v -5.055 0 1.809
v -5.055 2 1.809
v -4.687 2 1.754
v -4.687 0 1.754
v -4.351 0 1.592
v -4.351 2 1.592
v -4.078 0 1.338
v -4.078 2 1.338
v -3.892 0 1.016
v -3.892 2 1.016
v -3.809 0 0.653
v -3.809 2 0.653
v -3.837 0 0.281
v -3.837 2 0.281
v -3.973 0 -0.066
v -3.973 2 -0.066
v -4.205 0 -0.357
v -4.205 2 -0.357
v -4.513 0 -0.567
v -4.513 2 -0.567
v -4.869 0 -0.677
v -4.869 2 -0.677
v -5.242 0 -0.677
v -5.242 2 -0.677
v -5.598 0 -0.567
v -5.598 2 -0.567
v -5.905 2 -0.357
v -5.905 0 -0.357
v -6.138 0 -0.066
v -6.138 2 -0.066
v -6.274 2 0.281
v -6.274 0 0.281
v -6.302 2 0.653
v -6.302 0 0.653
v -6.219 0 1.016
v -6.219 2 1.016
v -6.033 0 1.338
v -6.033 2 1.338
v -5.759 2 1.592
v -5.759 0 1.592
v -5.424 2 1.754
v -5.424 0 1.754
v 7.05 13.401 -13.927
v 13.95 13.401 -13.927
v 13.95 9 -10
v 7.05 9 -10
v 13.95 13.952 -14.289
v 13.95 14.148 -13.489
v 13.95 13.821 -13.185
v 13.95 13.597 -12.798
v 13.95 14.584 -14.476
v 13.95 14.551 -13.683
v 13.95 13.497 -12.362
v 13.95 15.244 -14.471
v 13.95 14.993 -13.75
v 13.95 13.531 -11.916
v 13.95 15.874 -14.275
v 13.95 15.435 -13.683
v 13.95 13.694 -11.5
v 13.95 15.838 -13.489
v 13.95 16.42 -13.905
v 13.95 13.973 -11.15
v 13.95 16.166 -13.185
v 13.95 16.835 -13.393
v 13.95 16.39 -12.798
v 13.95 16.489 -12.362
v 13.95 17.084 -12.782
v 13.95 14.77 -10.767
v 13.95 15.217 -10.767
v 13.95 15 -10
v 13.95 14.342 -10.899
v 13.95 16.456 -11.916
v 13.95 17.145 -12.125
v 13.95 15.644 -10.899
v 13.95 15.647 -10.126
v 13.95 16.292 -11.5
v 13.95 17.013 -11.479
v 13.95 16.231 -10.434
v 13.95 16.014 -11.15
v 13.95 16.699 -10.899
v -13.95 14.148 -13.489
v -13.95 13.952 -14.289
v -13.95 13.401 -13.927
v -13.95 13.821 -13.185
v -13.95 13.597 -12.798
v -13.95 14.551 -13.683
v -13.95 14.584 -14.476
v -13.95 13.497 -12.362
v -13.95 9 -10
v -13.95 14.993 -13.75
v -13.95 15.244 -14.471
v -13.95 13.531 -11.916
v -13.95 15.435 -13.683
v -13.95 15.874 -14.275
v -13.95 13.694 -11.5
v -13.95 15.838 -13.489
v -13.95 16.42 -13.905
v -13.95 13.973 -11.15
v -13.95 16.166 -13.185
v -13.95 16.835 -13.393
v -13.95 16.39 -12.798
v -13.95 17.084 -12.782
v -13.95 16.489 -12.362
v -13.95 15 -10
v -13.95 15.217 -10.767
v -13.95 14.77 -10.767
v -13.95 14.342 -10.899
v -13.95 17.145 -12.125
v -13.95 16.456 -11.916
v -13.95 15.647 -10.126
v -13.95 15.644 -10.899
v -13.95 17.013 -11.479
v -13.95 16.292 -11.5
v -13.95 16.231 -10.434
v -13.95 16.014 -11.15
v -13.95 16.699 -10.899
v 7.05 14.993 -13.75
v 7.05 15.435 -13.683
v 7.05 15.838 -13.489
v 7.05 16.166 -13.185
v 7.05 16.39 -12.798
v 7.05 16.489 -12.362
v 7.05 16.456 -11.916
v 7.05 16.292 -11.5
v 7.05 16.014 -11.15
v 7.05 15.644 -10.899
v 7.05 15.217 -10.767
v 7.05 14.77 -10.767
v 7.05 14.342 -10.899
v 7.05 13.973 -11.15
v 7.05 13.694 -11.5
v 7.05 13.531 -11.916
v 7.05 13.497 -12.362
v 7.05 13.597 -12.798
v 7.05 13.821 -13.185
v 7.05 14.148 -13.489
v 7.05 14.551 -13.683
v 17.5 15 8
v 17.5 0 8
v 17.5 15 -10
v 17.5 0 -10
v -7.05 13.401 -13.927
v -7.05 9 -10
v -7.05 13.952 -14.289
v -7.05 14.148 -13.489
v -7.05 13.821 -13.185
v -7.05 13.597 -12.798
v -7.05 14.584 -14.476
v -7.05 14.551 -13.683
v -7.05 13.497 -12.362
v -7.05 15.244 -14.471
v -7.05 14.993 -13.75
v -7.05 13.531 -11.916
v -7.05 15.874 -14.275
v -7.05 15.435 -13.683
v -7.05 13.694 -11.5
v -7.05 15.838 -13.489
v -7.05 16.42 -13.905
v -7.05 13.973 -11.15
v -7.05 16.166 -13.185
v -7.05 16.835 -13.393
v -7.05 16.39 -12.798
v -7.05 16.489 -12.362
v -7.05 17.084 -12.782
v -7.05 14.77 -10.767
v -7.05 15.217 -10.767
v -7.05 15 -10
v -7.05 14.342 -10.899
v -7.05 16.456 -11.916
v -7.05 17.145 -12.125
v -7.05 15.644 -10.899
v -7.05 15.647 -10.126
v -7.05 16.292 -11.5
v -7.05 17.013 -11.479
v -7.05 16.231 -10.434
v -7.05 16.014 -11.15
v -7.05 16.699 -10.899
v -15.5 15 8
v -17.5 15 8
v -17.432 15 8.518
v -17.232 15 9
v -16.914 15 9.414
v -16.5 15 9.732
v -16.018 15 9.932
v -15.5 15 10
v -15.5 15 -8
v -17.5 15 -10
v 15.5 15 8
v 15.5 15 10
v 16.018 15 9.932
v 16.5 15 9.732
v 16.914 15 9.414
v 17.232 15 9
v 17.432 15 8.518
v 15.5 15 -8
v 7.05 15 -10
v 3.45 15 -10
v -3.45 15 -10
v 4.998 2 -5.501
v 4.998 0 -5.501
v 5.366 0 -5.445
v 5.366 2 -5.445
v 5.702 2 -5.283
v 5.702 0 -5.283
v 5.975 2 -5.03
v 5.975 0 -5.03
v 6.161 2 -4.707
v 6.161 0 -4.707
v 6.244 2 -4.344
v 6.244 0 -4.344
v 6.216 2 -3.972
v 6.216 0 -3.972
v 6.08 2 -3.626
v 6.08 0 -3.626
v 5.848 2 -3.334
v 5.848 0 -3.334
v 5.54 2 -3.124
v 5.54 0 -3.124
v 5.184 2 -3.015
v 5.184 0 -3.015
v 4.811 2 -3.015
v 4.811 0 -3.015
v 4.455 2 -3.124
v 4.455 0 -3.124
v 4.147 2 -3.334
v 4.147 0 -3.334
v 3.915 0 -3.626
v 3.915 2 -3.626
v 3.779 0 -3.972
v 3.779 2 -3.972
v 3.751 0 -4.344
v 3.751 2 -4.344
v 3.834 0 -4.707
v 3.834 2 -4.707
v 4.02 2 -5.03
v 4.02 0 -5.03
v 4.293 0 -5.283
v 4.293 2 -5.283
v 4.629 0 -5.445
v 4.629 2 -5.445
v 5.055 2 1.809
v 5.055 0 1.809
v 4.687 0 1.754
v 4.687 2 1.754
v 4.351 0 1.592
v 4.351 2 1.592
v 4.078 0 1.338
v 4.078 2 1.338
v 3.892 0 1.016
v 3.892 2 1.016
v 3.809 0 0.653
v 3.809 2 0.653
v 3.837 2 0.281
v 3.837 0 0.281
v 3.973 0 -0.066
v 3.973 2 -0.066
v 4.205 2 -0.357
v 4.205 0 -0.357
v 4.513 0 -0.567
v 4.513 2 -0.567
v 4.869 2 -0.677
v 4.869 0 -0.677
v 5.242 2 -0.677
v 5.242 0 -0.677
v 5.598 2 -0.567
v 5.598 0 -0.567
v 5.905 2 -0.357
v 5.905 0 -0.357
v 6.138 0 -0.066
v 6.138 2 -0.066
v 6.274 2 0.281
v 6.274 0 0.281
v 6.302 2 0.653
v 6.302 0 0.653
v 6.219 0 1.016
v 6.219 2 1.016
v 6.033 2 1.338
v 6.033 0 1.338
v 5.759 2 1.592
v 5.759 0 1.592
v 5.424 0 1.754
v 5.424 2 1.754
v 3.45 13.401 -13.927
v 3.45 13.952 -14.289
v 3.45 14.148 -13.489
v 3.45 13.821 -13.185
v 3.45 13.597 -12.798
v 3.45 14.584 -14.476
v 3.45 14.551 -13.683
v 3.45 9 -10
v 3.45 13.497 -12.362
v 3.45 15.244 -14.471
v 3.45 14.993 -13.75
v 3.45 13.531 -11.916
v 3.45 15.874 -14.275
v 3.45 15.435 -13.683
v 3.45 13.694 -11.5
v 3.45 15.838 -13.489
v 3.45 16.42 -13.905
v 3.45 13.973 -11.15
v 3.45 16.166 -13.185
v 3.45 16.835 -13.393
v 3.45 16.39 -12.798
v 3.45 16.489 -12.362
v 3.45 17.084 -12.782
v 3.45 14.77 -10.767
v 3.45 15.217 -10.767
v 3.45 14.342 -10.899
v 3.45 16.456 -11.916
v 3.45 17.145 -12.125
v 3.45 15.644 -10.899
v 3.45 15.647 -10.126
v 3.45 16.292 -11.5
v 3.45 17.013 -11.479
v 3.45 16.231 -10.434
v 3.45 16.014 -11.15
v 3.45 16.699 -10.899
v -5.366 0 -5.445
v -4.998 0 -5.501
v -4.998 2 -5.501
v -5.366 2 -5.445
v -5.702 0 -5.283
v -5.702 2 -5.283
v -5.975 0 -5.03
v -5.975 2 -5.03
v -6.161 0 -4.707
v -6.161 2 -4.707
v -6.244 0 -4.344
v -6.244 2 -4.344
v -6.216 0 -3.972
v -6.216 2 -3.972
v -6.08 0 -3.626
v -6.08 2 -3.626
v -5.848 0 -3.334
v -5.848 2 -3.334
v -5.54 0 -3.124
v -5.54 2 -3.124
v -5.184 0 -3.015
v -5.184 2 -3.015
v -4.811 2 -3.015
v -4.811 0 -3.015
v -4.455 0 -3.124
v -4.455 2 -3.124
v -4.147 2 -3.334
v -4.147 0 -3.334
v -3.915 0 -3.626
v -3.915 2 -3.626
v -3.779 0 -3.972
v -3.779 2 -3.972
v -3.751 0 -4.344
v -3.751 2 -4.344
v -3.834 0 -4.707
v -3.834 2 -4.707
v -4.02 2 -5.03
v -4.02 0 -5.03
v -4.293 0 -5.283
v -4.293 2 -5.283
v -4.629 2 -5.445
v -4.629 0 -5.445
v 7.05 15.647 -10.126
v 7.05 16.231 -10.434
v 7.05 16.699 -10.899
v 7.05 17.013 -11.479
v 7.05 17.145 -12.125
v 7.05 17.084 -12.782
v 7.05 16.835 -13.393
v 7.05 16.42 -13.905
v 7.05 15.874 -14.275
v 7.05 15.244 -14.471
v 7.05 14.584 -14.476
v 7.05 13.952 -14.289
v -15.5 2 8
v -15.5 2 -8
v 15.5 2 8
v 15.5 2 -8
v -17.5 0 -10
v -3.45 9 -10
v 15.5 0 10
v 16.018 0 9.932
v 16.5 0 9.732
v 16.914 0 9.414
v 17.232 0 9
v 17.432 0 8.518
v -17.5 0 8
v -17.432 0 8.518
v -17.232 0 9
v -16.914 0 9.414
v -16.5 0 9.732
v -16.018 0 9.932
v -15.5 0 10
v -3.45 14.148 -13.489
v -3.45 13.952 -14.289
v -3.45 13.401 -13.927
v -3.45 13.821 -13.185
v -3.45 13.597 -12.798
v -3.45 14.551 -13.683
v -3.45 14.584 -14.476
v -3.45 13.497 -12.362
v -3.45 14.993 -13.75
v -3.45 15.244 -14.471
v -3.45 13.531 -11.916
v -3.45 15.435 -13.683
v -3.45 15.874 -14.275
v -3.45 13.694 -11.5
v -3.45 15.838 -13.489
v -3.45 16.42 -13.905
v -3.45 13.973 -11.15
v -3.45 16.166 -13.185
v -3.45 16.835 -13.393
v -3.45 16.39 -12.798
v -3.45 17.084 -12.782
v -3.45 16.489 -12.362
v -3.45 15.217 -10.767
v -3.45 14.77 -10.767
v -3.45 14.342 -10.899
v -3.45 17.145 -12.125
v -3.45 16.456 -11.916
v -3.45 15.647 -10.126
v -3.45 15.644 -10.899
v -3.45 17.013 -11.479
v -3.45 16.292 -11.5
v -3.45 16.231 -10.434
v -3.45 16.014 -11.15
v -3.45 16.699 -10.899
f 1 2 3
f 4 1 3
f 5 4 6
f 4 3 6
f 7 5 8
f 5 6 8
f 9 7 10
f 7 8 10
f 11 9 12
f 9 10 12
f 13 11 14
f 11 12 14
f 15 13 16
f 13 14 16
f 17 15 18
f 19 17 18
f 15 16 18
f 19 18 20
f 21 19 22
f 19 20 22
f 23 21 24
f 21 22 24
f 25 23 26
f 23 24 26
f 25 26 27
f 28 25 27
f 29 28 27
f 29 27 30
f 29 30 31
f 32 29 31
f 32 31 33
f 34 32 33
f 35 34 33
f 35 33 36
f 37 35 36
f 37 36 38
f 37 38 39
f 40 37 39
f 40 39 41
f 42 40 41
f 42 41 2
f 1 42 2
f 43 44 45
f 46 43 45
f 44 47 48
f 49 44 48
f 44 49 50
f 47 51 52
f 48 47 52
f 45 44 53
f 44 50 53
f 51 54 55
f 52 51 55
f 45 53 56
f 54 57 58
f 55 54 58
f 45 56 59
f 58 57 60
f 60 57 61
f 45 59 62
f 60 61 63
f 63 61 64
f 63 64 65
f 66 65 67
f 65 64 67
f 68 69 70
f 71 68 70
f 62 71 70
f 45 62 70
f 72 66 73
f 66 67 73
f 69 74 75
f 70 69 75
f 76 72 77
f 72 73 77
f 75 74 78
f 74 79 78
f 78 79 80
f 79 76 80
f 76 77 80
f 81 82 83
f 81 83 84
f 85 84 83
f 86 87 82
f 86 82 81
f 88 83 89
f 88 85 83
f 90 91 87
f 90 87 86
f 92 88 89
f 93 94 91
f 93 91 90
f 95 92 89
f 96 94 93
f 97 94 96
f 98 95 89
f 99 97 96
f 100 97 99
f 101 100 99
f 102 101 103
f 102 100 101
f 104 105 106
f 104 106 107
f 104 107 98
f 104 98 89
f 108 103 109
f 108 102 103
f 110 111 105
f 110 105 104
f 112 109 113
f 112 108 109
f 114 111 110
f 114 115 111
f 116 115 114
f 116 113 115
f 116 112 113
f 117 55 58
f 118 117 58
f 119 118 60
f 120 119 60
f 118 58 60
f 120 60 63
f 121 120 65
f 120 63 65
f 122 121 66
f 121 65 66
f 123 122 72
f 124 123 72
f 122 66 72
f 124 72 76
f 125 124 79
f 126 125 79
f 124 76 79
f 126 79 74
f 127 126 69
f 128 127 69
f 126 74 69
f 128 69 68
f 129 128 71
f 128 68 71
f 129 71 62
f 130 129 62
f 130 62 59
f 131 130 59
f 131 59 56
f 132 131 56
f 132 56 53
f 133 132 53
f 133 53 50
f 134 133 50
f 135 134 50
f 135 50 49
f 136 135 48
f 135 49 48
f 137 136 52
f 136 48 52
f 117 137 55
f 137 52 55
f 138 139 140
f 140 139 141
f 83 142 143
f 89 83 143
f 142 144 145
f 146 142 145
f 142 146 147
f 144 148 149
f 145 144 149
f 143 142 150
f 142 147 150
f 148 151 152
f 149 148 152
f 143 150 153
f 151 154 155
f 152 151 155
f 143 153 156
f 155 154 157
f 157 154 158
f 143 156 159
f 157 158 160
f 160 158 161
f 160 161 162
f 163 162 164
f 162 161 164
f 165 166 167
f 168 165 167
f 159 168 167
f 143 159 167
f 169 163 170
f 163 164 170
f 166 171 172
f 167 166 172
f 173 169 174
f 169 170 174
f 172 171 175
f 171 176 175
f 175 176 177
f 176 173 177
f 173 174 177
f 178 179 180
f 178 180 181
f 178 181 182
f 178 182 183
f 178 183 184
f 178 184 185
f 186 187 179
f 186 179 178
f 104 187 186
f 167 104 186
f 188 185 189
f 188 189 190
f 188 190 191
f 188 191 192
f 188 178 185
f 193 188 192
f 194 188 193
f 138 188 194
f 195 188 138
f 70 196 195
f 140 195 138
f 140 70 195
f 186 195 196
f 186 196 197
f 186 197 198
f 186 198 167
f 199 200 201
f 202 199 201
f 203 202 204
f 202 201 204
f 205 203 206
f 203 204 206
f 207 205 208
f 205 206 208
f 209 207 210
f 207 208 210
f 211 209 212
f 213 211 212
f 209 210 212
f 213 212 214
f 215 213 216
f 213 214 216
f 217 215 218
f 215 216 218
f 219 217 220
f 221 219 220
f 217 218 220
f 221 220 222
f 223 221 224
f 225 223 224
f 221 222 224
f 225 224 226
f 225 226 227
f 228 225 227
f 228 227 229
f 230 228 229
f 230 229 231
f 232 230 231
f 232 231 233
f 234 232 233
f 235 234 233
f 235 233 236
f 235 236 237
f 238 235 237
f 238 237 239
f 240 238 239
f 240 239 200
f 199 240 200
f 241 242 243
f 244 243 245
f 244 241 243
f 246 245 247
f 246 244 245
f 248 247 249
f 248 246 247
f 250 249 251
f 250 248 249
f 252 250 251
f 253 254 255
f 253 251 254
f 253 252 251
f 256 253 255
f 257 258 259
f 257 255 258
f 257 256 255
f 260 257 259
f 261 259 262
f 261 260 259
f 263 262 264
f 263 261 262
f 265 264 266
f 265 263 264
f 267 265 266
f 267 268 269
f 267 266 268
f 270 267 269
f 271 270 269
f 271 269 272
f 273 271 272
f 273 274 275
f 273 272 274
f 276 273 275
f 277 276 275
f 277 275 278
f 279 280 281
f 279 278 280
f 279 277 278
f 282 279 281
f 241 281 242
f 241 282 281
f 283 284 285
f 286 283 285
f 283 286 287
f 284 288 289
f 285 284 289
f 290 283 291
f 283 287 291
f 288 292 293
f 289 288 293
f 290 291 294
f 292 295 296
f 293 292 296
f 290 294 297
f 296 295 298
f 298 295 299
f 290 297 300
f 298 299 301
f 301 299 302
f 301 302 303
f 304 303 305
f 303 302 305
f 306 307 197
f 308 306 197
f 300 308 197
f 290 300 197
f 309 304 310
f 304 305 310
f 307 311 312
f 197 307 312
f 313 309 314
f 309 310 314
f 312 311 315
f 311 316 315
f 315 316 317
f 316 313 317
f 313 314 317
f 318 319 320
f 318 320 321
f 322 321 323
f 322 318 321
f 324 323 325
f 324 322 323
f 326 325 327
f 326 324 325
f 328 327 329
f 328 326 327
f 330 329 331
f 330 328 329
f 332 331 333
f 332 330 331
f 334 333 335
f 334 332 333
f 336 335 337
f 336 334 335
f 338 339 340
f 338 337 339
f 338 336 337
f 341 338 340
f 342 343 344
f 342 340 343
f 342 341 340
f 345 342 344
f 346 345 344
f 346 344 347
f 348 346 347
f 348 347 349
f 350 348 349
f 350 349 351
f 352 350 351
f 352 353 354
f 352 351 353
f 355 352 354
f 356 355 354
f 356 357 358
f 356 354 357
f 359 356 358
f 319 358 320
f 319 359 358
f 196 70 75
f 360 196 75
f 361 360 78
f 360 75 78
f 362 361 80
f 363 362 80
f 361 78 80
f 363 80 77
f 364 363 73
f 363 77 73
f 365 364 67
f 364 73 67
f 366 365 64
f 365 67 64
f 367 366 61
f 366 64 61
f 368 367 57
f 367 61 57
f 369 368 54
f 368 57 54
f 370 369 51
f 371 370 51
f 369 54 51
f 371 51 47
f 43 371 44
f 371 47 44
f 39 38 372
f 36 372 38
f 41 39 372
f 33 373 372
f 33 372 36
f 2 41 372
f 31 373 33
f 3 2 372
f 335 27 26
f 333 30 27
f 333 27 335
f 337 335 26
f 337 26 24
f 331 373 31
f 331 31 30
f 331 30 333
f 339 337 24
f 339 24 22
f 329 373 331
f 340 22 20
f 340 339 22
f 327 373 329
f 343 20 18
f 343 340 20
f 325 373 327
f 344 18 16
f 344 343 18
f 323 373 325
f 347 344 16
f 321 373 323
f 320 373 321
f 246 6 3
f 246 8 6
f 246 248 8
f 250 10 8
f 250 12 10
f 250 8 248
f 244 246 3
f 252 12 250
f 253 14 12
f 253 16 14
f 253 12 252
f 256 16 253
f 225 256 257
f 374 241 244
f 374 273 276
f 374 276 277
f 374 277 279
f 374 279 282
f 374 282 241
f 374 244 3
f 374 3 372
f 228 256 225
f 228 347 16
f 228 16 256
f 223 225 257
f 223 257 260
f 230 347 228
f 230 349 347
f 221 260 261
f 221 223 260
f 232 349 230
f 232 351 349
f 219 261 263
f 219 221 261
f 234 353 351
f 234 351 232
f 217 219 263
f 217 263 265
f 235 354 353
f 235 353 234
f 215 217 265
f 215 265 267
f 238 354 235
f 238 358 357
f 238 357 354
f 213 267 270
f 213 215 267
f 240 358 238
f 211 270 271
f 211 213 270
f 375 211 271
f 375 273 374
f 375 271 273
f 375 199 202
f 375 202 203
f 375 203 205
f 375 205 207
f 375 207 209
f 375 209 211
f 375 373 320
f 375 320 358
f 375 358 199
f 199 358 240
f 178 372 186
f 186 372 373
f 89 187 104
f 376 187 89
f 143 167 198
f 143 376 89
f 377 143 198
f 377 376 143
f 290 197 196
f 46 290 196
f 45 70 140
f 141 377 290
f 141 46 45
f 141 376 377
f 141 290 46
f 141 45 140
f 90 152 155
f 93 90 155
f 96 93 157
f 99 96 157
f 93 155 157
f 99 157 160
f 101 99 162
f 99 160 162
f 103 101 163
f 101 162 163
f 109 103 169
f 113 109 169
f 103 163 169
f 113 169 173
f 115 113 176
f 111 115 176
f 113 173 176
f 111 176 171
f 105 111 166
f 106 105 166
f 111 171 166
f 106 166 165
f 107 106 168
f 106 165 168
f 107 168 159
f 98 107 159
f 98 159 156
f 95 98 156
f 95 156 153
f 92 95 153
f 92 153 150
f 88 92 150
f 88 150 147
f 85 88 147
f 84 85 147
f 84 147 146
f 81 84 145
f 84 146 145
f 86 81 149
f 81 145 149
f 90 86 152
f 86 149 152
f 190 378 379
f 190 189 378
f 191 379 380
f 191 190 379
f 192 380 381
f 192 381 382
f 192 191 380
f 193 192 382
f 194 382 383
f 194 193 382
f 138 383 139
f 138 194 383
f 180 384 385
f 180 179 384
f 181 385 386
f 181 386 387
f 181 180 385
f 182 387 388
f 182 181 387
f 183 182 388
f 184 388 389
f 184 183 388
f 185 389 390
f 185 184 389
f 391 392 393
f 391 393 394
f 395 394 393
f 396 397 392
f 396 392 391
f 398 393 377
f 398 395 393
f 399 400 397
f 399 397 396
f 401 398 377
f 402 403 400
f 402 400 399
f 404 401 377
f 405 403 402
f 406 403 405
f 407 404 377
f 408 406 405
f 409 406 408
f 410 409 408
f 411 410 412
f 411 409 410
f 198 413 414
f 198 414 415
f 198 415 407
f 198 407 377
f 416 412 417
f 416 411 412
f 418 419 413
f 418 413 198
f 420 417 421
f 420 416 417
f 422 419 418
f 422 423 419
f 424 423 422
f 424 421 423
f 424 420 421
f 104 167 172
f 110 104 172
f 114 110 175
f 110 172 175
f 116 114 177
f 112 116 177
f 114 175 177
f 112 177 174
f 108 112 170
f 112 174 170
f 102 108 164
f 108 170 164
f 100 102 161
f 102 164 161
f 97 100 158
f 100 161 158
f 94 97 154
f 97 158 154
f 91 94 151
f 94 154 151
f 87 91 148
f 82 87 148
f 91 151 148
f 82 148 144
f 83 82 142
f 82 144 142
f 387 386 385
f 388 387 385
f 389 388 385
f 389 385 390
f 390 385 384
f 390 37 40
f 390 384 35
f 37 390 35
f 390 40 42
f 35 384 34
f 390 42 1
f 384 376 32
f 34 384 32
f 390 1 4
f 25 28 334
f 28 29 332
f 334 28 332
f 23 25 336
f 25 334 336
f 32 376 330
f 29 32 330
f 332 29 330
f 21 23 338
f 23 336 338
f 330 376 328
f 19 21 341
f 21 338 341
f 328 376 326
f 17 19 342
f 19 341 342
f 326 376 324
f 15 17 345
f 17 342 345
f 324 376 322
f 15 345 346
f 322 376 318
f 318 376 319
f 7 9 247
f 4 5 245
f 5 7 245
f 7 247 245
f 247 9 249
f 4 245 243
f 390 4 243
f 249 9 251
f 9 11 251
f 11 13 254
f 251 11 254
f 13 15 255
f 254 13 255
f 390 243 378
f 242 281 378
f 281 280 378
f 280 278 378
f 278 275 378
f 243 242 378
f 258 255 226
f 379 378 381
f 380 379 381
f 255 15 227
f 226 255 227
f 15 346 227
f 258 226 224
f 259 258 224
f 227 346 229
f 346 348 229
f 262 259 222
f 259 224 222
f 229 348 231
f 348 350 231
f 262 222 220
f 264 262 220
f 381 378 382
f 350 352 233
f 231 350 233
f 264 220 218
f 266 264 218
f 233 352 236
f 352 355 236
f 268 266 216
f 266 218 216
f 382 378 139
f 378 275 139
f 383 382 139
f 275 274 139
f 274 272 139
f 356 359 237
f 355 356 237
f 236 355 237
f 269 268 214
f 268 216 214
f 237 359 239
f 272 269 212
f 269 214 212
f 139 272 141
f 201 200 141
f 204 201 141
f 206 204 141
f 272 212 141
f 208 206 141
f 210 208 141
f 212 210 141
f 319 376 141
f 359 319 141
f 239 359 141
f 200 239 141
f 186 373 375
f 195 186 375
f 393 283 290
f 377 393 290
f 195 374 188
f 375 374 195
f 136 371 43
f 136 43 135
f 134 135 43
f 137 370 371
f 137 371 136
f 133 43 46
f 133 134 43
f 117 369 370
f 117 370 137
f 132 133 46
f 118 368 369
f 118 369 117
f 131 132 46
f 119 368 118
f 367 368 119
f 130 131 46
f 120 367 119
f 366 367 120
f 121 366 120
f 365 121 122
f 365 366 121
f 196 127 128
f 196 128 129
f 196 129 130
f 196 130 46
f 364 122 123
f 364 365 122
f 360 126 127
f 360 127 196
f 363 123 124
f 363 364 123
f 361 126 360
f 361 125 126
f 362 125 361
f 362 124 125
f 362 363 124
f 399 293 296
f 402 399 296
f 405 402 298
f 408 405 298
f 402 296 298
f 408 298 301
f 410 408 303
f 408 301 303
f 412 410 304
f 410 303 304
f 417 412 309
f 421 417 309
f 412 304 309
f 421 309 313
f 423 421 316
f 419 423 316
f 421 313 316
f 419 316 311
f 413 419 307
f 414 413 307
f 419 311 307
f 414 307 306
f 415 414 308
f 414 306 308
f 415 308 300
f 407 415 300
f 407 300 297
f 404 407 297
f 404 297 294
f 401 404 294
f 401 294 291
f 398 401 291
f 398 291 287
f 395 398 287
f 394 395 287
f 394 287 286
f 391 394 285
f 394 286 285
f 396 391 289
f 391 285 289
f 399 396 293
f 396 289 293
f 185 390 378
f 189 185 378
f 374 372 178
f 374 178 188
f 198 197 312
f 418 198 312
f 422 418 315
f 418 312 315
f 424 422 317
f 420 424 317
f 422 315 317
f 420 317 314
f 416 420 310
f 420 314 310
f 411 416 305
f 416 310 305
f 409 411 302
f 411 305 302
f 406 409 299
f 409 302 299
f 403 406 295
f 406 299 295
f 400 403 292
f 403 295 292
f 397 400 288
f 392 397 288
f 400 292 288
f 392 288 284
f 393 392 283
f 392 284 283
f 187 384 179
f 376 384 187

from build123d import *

# Parameters (mm, degrees)
SKETCH1_W           = 35
SKETCH1_H           = 20
BOSS_EXTRUDE4_DEPTH = 15
SHELL2_T            = -2
SKETCH8_R           = 1.5
BOSS_EXTRUDE7_DEPTH = 6.9
LPATTERN4_COUNT     = 3
LPATTERN4_PITCH     = 10.5
FILLET1_R           = 2
CUT_EXTRUDE2_START  = -5
SKETCH9_R           = 1.25
CUT_EXTRUDE2_DEPTH  = 34.469380611
SKETCH10_R          = 1.25
CUT_EXTRUDE3_DEPTH  = 28.311380776


with BuildPart() as part:
    # Sketch1 → Boss-Extrude4 (new body)
    with BuildSketch(Plane(origin=(0, 0, 0), x_dir=(1, 0, 0), z_dir=(0, 1, 0))):
        Rectangle(SKETCH1_W, SKETCH1_H)
    extrude(amount=BOSS_EXTRUDE4_DEPTH)

    # Shell2
    shell2_openings = [part.faces().sort_by_distance(p)[0] for p in [
        (0, 15, 0),
    ]]
    offset(amount=SHELL2_T, openings=shell2_openings, kind=Kind.INTERSECTION)

    # Sketch8 → Boss-Extrude7 (add)
    with BuildSketch(Plane(origin=(13.95, 0, 0), x_dir=(0, 0, -1), z_dir=(1, 0, 0))):
        with BuildLine():
            Line((13.926543174, 13.400522246), (10, 9))
            Line((10, 9), (10, 15))
            ThreePointArc((10, 15), (13.096526294, 16.982277643), (13.926543174, 13.400522246))
        make_face()
        with Locations((12.249990037, 14.993304126)):
            Circle(SKETCH8_R, mode=Mode.SUBTRACT)
    boss_extrude7 = extrude(amount=-BOSS_EXTRUDE7_DEPTH)

    # LPattern4: Boss-Extrude7 ×3
    with Locations(*[(-i * LPATTERN4_PITCH, 0, 0) for i in range(1, LPATTERN4_COUNT)]):
        add(boss_extrude7)

    # Fillet1
    fillet1_edges = [part.edges().sort_by_distance(p)[0] for p in [
        (17.5, 7.5, 10),
        (-17.5, 7.5, 10),
    ]]
    fillet(fillet1_edges, radius=FILLET1_R)

    # Sketch9 → Cut-Extrude2 (cut)
    with BuildSketch(Plane(origin=(0, 0, 0), x_dir=(1, 0, 0), z_dir=(0, 1, 0)).offset(CUT_EXTRUDE2_START)):
        with Locations(Location((-4.997517741, 4.250548665, 0), (0, 0, 90))):
            Circle(SKETCH9_R)
    cut_extrude2 = extrude(amount=CUT_EXTRUDE2_DEPTH, mode=Mode.SUBTRACT)

    # Sketch10 → Cut-Extrude3 (cut, through all)
    with BuildSketch(Plane(origin=(0, 2, 0), x_dir=(1, 0, 0), z_dir=(0, 1, 0))):
        with Locations(Location((-5.055245898, -0.559104904, 0), (0, 0, 270))):
            Circle(SKETCH10_R)
    cut_extrude3 = extrude(amount=-CUT_EXTRUDE3_DEPTH, mode=Mode.SUBTRACT)

    # Mirror1: Cut-Extrude2, Cut-Extrude3 across plane
    add(cut_extrude2.mirror(Plane(origin=(0, 0, 0), x_dir=(0, 0, 1), z_dir=(1, 0, 0))), mode=Mode.SUBTRACT)
    add(cut_extrude3.mirror(Plane(origin=(0, 0, 0), x_dir=(0, 0, 1), z_dir=(1, 0, 0))), mode=Mode.SUBTRACT)


solid = part.part
